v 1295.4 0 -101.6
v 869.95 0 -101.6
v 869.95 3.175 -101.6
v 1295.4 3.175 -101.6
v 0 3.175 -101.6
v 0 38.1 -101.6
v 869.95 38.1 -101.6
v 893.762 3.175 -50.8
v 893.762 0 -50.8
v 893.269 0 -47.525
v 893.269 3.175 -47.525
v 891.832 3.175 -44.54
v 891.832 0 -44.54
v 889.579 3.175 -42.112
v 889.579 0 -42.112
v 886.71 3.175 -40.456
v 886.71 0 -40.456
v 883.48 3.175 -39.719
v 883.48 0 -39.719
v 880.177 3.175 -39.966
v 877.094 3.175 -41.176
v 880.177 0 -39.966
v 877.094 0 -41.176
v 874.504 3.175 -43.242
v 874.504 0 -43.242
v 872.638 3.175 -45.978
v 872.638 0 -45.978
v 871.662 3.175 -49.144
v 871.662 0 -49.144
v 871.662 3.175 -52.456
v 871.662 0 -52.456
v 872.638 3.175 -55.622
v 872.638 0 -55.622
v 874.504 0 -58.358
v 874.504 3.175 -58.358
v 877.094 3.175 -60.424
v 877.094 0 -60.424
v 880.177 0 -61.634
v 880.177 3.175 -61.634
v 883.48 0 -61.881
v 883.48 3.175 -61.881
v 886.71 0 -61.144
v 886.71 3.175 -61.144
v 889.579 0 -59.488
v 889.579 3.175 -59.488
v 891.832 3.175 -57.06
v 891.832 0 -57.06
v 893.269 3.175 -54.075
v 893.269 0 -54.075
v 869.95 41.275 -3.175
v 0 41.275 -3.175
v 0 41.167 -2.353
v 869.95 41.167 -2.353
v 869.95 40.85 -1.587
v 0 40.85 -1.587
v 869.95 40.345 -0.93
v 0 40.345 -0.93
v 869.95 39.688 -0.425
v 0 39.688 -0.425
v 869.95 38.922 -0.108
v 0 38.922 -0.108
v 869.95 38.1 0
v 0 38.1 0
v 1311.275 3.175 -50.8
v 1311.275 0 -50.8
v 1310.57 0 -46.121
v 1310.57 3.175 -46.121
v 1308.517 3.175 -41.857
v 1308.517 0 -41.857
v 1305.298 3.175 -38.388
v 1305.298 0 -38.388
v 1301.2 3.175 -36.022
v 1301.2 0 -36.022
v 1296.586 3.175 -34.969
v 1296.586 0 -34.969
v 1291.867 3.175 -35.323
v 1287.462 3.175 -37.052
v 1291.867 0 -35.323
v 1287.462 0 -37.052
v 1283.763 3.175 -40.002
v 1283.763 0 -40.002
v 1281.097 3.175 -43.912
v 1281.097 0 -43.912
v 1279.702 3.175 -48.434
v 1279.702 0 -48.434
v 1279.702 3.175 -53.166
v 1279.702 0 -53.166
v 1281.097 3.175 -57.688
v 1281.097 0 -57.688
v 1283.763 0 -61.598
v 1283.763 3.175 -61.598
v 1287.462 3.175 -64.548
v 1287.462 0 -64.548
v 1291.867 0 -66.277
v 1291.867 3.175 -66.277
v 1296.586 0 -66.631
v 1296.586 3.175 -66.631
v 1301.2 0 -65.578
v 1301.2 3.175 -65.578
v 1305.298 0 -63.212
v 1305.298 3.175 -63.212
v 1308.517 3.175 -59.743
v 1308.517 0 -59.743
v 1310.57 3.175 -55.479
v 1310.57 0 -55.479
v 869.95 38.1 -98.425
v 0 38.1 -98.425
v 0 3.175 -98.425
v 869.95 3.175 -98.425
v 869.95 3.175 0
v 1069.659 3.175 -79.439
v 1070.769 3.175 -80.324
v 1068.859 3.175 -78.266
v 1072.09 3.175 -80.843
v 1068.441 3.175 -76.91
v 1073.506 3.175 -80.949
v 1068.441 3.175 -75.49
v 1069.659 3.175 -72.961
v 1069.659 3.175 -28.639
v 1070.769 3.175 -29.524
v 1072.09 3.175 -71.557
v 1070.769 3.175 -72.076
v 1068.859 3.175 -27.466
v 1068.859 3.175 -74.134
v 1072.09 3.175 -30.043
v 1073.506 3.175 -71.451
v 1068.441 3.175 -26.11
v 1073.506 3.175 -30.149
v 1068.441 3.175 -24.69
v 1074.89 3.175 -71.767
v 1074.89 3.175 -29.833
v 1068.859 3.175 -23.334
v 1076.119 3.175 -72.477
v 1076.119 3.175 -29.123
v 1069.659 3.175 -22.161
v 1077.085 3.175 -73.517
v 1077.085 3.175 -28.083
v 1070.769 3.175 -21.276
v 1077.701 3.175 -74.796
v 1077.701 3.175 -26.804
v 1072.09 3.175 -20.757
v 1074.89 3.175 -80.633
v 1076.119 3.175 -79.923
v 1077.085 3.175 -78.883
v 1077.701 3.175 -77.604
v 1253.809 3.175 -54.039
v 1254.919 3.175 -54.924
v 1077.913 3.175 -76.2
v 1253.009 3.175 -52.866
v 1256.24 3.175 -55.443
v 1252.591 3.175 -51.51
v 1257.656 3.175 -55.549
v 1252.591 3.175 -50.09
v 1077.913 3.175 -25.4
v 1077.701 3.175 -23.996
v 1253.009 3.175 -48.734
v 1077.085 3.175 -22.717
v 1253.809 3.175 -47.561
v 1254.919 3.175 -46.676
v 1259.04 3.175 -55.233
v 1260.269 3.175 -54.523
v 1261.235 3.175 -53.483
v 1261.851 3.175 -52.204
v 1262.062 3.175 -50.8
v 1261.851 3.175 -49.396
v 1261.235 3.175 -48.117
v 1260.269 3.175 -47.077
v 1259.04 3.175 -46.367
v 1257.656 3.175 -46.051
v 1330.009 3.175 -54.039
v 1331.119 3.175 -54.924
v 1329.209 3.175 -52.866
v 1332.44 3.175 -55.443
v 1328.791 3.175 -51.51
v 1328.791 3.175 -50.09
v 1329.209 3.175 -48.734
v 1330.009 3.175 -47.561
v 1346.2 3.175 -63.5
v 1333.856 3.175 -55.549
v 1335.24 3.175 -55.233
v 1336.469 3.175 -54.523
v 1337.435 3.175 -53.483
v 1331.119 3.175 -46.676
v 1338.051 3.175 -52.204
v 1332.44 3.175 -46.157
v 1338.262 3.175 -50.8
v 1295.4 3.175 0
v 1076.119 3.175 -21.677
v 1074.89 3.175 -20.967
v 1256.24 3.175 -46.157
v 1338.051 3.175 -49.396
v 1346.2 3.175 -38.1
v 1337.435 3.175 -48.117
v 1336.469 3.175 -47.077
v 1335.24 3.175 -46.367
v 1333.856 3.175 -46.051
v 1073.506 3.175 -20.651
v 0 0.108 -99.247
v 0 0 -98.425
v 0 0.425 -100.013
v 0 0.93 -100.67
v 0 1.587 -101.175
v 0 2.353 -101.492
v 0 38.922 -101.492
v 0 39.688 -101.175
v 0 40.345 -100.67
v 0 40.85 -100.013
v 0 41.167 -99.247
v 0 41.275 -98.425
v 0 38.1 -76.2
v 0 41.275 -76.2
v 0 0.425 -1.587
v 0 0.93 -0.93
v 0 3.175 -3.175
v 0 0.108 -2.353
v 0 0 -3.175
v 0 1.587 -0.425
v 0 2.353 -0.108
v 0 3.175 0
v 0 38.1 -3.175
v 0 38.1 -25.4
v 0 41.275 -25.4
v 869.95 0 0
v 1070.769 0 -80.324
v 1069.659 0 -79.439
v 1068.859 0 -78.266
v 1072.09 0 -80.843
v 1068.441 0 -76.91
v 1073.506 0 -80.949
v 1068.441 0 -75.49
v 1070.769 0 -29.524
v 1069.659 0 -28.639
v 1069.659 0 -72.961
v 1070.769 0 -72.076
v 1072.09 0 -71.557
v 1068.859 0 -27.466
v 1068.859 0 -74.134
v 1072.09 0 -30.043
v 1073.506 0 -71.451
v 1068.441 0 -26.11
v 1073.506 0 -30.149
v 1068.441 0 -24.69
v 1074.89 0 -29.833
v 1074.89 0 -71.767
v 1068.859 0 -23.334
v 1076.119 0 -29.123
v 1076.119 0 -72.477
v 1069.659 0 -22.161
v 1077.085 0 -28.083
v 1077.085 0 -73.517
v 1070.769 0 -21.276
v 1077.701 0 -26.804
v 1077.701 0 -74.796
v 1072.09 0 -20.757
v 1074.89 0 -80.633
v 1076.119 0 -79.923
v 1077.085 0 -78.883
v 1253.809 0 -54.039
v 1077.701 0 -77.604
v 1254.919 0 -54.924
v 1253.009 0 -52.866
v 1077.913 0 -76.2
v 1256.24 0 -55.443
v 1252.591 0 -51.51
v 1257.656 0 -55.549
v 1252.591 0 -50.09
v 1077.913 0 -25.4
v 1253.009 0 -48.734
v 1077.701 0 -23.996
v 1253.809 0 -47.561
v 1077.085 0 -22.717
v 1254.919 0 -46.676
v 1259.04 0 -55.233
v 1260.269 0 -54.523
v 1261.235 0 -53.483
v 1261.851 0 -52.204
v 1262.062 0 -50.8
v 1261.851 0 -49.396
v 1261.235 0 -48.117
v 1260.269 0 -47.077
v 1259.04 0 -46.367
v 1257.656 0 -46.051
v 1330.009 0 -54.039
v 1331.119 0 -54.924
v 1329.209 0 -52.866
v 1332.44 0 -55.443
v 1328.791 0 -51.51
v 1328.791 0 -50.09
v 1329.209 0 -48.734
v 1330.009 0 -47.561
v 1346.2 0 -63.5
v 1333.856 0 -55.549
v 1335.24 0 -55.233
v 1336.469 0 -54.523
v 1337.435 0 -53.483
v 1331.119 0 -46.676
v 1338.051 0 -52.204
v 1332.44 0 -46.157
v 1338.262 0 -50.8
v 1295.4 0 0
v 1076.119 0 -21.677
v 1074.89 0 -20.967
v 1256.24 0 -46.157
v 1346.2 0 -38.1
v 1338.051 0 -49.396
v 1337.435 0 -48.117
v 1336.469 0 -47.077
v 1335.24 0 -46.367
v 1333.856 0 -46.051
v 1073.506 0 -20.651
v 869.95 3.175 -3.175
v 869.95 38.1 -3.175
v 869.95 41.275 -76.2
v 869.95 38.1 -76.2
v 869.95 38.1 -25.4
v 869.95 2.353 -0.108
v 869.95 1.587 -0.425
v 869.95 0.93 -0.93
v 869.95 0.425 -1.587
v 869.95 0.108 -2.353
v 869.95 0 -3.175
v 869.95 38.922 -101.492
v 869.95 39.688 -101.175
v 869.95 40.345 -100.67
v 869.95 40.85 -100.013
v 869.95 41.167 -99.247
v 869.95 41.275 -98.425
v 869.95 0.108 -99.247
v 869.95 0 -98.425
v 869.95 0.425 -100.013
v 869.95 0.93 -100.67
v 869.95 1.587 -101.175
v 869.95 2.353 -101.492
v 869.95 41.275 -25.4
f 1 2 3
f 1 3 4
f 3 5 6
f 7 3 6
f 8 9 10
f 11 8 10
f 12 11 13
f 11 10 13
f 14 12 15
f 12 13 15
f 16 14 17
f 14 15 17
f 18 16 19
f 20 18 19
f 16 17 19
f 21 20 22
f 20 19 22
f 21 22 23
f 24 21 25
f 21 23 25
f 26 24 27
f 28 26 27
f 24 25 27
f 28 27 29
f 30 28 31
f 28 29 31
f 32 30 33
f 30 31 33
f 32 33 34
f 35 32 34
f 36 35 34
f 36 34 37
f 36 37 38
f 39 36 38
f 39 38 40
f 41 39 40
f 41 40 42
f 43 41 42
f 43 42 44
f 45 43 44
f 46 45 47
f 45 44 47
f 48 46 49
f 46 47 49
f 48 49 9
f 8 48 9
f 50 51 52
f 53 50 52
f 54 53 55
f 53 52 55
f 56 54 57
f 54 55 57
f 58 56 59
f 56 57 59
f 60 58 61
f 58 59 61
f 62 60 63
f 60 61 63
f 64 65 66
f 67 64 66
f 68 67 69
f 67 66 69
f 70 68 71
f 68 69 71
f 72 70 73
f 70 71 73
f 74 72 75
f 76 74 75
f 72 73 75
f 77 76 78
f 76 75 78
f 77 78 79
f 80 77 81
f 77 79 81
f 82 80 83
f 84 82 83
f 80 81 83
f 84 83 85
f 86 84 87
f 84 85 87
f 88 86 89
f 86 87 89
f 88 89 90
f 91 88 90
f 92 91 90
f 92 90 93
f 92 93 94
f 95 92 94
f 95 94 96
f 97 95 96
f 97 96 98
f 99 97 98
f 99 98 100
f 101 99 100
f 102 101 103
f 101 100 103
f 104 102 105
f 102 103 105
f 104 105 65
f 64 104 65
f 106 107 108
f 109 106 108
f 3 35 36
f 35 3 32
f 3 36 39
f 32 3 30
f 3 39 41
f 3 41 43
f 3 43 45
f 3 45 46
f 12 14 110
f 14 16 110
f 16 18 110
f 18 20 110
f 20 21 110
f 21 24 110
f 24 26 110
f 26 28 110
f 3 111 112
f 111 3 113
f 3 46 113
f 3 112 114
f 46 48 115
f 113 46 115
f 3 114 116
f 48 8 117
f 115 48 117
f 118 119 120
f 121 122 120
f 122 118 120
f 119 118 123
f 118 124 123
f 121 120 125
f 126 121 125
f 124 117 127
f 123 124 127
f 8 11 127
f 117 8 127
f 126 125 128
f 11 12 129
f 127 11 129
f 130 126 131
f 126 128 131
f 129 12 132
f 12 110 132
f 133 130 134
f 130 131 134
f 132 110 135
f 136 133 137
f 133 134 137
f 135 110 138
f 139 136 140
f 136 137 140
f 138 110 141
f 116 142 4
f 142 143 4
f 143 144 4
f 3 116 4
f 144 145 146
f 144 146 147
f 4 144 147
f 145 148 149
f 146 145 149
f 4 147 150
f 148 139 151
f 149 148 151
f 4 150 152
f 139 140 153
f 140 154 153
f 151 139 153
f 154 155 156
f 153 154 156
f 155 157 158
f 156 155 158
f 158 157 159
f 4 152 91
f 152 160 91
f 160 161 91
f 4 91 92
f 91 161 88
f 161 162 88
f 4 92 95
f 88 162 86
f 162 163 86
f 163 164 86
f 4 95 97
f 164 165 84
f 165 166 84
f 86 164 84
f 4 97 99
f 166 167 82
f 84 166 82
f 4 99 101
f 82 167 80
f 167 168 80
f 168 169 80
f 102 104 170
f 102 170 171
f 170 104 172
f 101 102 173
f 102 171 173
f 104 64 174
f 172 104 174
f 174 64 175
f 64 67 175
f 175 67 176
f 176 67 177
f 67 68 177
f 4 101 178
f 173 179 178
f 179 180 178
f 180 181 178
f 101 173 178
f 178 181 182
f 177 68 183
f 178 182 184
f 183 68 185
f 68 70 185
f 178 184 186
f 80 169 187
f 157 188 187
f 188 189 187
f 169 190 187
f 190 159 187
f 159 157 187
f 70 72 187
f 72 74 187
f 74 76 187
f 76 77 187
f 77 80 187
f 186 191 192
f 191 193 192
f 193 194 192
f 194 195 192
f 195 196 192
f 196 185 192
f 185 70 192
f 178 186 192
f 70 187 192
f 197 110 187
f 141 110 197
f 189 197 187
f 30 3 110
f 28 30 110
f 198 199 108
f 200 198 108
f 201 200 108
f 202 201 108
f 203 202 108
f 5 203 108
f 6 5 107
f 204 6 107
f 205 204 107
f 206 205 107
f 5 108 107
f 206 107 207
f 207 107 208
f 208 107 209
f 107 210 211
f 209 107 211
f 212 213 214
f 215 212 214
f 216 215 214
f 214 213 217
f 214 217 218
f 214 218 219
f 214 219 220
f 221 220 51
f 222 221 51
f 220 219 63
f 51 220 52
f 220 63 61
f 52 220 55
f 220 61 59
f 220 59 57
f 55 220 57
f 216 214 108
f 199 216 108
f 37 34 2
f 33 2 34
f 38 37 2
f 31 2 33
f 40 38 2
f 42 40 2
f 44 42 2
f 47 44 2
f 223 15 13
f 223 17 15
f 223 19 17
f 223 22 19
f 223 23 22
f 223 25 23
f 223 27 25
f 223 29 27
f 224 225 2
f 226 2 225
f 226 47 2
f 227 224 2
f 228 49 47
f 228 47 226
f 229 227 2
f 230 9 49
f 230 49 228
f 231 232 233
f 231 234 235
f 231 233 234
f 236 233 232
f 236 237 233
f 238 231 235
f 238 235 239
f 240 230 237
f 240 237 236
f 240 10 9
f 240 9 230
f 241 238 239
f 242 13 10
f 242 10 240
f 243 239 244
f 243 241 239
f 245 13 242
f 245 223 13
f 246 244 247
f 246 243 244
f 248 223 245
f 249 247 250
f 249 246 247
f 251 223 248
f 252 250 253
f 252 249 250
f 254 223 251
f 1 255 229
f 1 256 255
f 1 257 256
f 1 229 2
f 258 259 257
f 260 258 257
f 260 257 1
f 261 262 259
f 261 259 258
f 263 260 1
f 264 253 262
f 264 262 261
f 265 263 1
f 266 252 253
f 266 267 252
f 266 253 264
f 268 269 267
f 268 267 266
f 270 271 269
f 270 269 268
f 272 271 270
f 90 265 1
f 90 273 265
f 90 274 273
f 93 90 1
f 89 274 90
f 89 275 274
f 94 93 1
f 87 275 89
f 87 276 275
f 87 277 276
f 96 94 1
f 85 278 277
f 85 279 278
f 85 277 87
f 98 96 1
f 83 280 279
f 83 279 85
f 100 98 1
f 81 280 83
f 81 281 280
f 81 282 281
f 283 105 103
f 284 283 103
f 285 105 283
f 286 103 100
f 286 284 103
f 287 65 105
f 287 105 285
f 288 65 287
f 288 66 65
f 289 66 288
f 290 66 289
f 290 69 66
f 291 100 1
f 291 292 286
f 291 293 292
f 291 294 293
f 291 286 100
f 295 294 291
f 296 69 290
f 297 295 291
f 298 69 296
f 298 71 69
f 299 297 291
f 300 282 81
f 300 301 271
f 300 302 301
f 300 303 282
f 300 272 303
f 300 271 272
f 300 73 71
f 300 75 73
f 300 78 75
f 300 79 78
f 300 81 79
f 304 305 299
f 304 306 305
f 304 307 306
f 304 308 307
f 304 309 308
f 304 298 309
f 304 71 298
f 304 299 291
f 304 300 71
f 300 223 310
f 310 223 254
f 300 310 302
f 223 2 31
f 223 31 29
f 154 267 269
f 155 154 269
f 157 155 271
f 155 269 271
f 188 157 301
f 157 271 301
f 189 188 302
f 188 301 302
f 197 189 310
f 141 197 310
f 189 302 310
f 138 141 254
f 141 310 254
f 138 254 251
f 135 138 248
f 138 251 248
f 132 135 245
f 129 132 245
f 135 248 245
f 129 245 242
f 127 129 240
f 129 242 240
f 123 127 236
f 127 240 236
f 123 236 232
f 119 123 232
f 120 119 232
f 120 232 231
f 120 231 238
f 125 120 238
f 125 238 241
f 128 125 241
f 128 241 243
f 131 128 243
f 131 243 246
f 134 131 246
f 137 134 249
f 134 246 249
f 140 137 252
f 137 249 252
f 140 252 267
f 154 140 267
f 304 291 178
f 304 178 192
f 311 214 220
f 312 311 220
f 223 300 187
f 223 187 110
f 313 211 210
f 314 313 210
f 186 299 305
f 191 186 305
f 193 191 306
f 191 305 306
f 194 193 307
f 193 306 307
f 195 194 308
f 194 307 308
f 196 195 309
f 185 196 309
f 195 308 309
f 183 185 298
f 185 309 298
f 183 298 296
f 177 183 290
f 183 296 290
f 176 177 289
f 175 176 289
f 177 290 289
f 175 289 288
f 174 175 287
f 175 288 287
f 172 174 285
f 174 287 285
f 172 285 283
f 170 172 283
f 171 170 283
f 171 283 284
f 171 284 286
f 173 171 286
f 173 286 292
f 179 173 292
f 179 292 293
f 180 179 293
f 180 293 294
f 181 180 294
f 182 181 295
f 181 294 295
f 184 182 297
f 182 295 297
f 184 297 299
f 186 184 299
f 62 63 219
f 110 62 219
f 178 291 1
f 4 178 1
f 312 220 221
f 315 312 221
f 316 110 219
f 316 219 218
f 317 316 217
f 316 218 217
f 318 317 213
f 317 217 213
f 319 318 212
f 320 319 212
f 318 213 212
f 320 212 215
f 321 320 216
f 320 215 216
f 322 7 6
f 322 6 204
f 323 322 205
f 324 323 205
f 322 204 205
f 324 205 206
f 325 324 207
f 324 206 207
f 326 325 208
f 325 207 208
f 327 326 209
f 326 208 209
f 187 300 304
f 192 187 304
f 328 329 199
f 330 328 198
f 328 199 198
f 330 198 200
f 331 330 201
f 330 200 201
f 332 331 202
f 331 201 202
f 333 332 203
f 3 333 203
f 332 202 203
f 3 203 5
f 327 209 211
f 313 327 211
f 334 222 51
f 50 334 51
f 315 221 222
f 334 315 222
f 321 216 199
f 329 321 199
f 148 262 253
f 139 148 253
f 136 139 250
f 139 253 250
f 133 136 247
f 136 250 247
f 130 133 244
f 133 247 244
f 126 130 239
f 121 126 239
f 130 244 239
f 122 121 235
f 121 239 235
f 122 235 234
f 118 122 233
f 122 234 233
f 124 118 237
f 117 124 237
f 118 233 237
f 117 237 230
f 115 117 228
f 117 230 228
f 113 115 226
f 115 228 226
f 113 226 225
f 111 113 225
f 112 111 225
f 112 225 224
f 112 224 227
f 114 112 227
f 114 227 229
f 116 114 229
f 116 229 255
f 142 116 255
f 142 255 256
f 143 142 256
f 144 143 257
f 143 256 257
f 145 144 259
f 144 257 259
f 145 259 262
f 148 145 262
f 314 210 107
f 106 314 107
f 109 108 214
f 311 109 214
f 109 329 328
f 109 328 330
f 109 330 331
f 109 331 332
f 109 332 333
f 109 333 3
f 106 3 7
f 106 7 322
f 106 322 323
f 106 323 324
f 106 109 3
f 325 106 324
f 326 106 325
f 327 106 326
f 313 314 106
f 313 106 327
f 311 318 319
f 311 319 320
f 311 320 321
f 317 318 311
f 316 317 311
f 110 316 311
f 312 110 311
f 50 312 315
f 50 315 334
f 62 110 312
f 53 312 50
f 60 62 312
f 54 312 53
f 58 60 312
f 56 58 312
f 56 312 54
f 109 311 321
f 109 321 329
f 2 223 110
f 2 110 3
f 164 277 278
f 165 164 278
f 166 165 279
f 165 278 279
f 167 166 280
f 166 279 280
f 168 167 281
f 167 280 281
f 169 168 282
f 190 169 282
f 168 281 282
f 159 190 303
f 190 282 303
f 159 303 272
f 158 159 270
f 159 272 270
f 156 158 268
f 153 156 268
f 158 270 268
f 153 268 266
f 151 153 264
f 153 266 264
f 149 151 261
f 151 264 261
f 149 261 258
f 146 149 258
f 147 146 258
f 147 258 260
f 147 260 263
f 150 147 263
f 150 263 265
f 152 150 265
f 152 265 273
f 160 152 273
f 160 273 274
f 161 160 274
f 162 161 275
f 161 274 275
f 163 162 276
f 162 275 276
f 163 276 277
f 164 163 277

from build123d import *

# Parameters (mm, degrees)
F1_DEPTH = 869.95
F2_R     = 4.7625
F2_R_2   = 11.1125
F2_R_3   = 15.875
F3_DEPTH = 3.175
F5_DEPTH = 3.175


with BuildPart() as f1:
    # F0 (on Right) → F1 (new body)
    with BuildSketch(Plane.YZ):
        with BuildLine():
            Line((38.1, 0), (3.175, 0))
            ThreePointArc((3.175, 0), (0.9299359697, -0.9299359697), (0, -3.175))
            Line((0, -3.175), (0, -98.425))
            ThreePointArc((0, -98.425), (0.9299359697, -100.6700640303), (3.175, -101.6))
            Line((3.175, -101.6), (38.1, -101.6))
            ThreePointArc((38.1, -101.6), (40.3450640303, -100.6700640303), (41.275, -98.425))
            Line((41.275, -98.425), (41.275, -76.2))
            Line((41.275, -76.2), (38.1, -76.2))
            Line((38.1, -76.2), (38.1, -98.425))
            Line((38.1, -98.425), (3.175, -98.425))
            Line((3.175, -98.425), (3.175, -3.175))
            Line((3.175, -3.175), (38.1, -3.175))
            Line((38.1, -3.175), (38.1, -25.4))
            Line((38.1, -25.4), (41.275, -25.4))
            Line((41.275, -25.4), (41.275, -3.175))
            ThreePointArc((41.275, -3.175), (40.3450640303, -0.9299359697), (38.1, 0))
        make_face()
    extrude(amount=F1_DEPTH)


with BuildPart() as f3:
    # F2 (on face) → F3 (new body)
    with BuildSketch(Plane.XZ):
        Polygon((1346.2, 0), (869.95, 0), (869.95, -3.175), (869.95, -98.425), (869.95, -101.6), (1346.2, -101.6), align=None)
        with Locations((1073.15, -76.2)):
            Circle(F2_R, mode=Mode.SUBTRACT)
        with Locations((882.65, -50.8)):
            Circle(F2_R_2, mode=Mode.SUBTRACT)
        with Locations((1257.3, -50.8)):
            Circle(F2_R, mode=Mode.SUBTRACT)
        with Locations((1295.4, -50.8)):
            Circle(F2_R_3, mode=Mode.SUBTRACT)
        with Locations((1333.5, -50.8)):
            Circle(F2_R, mode=Mode.SUBTRACT)
        with Locations((1073.15, -25.4)):
            Circle(F2_R, mode=Mode.SUBTRACT)
    extrude(amount=-F3_DEPTH)

    # F4 (on face) → F5 (cut, through all)
    with BuildSketch(Plane.XZ):
        Polygon((1295.4, 0), (1346.2, -38.1), (1346.2, 0), align=None)
        Polygon((1346.2, -101.6), (1346.2, -63.5), (1295.4, -101.6), align=None)
    extrude(amount=-F5_DEPTH, mode=Mode.SUBTRACT)


solid = Compound([f1.part, f3.part])
